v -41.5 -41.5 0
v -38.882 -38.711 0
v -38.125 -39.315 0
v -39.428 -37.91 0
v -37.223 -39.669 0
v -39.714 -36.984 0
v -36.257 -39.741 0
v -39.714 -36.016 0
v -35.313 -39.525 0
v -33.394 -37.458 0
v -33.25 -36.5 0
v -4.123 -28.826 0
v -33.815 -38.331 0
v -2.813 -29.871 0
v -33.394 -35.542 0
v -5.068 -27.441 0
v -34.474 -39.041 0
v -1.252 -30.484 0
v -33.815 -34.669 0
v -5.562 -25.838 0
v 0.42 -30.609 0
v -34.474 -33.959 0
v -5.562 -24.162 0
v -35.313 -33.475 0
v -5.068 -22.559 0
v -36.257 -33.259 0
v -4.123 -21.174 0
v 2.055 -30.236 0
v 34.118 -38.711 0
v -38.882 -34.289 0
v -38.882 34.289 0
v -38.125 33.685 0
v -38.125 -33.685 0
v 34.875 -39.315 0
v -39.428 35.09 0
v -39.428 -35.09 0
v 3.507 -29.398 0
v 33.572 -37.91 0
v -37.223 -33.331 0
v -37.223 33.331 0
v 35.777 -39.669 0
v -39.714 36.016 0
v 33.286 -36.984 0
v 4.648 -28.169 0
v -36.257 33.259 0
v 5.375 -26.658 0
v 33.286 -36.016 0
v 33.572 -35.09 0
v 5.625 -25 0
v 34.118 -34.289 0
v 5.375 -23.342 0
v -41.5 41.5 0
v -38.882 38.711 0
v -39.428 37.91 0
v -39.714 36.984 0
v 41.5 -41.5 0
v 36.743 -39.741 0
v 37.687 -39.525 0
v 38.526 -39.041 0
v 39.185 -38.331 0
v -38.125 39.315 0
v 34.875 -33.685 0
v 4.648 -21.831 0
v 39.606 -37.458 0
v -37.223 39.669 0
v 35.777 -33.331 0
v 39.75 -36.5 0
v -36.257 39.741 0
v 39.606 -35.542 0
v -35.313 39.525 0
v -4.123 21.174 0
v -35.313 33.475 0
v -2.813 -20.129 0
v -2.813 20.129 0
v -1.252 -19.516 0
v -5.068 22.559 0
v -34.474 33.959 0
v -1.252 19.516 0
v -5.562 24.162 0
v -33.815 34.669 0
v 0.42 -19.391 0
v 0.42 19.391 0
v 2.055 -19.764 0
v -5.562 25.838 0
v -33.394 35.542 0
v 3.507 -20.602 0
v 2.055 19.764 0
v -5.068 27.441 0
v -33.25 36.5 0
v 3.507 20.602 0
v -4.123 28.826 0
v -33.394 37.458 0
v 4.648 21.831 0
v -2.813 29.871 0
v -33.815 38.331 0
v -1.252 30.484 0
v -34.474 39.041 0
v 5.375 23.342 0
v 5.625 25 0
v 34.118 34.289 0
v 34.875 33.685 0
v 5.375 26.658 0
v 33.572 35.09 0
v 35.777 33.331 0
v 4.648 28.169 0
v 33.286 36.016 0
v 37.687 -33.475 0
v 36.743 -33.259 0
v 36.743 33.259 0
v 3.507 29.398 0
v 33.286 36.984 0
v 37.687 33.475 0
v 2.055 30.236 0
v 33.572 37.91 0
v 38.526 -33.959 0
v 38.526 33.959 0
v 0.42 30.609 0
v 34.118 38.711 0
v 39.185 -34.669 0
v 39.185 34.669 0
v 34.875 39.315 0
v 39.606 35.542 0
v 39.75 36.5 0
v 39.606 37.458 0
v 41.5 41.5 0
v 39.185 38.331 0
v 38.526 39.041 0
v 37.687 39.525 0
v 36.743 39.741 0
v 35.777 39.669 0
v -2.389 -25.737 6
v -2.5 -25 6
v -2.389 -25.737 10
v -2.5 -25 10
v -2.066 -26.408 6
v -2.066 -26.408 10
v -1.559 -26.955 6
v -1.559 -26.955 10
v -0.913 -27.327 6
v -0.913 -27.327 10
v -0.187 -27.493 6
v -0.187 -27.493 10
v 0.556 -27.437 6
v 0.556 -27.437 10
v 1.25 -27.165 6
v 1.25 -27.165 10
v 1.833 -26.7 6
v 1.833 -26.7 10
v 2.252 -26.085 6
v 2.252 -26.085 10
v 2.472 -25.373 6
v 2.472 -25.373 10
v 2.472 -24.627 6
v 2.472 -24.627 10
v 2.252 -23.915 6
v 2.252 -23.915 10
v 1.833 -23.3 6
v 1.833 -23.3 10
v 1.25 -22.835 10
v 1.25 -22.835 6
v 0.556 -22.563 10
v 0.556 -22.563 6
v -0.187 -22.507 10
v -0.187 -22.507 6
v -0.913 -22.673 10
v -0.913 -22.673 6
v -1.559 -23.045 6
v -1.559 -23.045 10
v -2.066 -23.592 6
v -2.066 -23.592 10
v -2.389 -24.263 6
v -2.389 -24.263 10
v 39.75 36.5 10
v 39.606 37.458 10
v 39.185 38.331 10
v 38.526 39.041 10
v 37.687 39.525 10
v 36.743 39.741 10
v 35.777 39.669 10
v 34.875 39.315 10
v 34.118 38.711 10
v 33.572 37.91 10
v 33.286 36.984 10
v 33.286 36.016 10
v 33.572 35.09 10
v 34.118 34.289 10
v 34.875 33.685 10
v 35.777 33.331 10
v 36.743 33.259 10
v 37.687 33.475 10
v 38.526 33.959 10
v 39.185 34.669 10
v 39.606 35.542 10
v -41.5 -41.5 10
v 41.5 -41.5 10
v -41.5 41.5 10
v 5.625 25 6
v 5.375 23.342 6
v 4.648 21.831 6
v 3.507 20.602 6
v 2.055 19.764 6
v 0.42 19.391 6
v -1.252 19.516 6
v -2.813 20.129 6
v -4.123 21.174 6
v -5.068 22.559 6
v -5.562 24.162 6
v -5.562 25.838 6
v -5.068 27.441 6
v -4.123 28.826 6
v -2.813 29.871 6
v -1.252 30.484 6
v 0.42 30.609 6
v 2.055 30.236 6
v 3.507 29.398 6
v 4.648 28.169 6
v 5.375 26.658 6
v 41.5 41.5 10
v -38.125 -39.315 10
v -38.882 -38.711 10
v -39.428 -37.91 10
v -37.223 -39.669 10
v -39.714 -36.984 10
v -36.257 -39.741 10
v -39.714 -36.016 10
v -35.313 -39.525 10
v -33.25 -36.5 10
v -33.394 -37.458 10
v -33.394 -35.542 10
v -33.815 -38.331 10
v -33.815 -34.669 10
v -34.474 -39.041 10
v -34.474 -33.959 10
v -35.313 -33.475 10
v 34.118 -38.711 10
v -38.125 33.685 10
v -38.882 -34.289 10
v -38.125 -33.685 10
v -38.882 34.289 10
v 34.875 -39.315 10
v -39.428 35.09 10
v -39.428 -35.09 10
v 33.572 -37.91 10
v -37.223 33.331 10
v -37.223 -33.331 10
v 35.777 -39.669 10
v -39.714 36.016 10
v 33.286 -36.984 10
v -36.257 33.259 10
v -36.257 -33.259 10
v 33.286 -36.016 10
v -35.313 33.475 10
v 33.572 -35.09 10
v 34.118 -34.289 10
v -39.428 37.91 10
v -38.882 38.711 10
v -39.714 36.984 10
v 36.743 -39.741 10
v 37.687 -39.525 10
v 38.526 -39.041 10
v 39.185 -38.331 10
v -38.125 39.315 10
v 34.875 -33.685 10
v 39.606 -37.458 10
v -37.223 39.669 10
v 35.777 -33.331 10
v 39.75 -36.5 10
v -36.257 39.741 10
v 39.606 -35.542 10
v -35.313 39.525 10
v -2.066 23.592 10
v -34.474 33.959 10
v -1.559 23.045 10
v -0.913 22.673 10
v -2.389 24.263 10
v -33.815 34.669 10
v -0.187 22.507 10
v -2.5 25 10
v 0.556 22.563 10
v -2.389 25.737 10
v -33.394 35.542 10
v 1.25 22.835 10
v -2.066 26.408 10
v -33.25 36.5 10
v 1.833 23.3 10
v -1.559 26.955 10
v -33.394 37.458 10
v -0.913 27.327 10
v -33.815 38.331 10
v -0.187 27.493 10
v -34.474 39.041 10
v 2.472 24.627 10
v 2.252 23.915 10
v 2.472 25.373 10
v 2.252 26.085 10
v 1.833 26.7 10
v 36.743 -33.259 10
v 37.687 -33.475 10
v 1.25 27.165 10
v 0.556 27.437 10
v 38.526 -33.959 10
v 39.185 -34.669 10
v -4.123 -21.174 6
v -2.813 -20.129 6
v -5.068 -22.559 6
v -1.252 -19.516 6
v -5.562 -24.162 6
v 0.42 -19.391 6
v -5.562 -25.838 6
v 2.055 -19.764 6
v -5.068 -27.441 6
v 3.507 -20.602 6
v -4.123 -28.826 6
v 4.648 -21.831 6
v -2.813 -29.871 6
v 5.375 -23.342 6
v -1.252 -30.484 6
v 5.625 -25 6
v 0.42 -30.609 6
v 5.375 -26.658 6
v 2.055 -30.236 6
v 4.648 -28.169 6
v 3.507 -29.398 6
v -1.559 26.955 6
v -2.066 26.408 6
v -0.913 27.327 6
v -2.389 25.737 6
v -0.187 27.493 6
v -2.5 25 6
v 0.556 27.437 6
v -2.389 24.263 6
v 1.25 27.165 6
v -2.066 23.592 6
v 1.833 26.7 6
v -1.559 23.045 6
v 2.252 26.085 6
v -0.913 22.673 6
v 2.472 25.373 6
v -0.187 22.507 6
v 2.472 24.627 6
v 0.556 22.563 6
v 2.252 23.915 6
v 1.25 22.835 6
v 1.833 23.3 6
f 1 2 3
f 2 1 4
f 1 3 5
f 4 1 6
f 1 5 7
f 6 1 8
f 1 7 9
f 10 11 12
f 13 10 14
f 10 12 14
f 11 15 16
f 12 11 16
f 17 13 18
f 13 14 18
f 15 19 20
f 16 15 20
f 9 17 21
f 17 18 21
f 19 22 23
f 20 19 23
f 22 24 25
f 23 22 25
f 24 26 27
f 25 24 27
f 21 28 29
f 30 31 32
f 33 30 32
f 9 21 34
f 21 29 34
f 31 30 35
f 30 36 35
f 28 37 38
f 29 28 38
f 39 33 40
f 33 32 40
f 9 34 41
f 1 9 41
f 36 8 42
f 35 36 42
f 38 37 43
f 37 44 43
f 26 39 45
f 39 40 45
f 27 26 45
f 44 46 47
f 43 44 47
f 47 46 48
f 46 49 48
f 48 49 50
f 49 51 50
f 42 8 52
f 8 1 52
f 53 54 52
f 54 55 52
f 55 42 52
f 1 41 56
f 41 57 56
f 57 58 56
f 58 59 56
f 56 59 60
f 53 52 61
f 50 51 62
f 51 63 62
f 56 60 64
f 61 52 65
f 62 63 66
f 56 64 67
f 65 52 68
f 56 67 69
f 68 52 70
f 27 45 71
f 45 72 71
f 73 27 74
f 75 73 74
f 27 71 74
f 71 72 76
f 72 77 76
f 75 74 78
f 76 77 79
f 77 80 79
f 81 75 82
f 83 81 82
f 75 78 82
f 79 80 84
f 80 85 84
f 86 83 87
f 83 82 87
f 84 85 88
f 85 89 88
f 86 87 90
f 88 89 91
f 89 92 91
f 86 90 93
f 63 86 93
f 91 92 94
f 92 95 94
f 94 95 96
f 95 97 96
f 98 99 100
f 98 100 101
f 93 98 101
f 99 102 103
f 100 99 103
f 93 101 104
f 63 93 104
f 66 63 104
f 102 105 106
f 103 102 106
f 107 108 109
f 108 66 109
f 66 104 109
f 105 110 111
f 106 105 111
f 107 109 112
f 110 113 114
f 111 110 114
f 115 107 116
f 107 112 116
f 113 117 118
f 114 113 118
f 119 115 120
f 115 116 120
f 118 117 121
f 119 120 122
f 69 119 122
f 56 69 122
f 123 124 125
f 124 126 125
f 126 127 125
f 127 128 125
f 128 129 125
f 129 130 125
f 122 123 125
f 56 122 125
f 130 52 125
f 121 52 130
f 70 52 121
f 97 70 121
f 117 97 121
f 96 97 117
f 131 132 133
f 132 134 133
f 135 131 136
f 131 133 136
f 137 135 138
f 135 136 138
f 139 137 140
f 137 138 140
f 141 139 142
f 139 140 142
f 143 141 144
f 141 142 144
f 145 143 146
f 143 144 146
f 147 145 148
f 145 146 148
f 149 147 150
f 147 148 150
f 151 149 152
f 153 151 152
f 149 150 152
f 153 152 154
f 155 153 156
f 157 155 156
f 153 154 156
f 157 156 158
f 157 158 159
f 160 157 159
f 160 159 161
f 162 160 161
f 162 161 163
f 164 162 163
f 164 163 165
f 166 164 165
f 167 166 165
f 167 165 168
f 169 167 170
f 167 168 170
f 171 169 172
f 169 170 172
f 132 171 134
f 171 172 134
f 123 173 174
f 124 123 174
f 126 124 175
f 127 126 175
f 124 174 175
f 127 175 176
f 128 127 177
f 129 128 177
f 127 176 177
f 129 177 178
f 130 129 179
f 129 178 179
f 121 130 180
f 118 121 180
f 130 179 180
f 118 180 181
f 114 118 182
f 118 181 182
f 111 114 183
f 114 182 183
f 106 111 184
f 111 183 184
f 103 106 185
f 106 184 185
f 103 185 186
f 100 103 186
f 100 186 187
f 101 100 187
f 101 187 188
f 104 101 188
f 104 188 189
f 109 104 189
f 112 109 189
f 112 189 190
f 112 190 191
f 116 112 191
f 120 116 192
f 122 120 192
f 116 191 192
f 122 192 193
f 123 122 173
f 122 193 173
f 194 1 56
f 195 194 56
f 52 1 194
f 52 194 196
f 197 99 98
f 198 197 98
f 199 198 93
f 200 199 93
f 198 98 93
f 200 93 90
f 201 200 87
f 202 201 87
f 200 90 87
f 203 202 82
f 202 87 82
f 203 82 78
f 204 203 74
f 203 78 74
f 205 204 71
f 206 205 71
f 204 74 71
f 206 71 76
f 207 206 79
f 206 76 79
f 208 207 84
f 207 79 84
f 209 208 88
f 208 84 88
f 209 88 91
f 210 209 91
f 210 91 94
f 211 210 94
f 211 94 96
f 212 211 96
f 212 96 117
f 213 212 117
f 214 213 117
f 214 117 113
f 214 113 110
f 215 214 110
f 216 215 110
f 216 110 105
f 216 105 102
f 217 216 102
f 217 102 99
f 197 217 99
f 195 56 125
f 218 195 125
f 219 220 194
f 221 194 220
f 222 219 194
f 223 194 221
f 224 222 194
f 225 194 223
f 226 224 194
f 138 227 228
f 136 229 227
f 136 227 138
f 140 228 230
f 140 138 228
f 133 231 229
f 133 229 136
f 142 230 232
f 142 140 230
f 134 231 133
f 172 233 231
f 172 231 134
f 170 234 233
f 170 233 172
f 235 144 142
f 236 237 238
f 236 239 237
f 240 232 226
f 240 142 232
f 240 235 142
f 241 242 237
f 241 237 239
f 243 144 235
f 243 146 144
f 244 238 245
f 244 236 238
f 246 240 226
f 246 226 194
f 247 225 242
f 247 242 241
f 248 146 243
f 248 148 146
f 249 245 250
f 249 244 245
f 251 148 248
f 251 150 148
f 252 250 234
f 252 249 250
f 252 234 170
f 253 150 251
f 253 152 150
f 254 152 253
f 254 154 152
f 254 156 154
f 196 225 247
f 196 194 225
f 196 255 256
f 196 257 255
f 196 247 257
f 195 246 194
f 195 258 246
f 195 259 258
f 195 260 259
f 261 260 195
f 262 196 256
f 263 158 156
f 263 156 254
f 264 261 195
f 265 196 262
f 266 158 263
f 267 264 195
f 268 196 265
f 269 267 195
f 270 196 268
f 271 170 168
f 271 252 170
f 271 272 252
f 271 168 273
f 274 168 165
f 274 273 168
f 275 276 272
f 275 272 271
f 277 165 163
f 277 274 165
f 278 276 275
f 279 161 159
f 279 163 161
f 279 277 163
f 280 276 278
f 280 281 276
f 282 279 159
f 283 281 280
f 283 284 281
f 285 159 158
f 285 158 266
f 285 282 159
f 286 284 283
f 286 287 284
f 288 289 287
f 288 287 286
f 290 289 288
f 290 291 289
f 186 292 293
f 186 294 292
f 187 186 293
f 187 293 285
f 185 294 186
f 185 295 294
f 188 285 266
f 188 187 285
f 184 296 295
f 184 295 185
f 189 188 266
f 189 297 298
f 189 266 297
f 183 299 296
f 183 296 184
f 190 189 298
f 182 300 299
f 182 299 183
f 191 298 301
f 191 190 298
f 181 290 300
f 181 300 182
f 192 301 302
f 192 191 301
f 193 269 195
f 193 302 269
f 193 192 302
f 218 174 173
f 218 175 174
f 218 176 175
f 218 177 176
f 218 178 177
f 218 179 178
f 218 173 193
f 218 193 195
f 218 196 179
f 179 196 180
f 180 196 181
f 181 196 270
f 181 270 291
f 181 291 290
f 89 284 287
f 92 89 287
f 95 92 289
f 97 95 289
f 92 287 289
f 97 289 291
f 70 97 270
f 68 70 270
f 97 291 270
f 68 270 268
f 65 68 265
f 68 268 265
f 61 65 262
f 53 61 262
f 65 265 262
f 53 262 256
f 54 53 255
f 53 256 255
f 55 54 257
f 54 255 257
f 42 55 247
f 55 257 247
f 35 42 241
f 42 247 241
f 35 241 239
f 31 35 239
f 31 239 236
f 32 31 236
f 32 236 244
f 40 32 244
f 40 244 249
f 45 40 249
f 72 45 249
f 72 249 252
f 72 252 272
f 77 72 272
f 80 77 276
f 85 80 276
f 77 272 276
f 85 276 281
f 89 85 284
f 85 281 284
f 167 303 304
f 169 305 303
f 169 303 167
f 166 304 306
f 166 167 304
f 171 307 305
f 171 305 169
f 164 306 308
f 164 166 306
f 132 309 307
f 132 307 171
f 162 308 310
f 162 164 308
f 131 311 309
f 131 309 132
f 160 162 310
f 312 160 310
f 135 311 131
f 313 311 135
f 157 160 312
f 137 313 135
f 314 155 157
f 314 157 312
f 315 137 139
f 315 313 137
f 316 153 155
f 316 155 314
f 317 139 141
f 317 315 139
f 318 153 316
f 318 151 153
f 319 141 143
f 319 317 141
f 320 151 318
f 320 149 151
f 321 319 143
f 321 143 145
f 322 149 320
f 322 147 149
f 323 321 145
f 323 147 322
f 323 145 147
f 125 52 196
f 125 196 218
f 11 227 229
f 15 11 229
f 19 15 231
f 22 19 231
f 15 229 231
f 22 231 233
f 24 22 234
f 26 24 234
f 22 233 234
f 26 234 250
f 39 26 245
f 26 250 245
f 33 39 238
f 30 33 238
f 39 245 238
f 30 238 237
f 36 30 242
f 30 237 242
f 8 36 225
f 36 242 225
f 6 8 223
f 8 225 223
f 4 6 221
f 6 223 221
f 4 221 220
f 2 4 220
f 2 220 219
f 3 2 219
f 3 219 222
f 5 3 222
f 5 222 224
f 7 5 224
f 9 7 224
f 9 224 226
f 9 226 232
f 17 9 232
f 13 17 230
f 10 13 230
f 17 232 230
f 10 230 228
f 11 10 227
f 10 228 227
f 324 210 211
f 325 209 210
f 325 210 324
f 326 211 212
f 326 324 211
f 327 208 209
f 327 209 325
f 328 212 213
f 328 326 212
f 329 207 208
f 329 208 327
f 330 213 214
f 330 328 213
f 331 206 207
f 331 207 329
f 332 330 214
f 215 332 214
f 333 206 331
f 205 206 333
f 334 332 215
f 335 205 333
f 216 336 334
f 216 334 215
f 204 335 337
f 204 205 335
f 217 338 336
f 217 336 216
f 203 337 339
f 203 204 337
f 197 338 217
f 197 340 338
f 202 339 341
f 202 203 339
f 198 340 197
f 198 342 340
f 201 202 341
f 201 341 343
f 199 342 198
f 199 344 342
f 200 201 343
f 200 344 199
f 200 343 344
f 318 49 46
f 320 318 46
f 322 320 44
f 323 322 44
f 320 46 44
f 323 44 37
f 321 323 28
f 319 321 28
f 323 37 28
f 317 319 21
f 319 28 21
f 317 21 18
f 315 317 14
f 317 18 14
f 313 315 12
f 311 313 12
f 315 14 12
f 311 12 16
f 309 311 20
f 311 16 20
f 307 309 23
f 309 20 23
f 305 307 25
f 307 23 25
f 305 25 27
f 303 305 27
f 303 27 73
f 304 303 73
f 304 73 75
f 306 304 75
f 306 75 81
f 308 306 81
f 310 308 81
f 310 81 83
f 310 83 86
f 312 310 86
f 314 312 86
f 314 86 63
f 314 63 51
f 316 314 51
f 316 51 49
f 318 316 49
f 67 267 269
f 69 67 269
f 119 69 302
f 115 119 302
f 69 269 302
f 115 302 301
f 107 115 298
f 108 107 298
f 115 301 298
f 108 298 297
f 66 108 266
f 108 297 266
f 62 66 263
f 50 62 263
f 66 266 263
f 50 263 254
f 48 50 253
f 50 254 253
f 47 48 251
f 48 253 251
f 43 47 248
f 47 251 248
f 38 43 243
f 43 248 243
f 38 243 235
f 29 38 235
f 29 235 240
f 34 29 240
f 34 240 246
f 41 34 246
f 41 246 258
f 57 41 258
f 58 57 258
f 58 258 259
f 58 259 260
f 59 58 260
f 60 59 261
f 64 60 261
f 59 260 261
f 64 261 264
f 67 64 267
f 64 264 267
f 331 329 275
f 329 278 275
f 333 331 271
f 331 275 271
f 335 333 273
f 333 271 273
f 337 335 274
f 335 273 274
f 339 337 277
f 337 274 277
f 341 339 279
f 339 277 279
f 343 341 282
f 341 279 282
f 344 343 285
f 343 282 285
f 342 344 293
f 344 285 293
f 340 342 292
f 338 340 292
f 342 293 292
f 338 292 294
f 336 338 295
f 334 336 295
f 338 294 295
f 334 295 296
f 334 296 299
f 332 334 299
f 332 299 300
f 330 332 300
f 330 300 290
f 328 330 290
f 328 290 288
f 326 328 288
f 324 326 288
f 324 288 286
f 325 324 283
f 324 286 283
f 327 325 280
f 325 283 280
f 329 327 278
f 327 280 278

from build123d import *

# Parameters (mm, degrees)
F0_W           = 83
F0_H           = 83
F1_DEPTH       = 10
F2_R           = 3.25
F3_DEPTH       = 10
F5_D           = 5
F5_DEPTH       = 15
F5_CBORE_D     = 11.25
F5_CBORE_DEPTH = 6
F5_TIP         = 1.5021515476


with BuildPart() as f1:
    # F0 (on Top) → F1 (new body)
    with BuildSketch(Plane.XY):
        Rectangle(F0_W, F0_H)
    extrude(amount=F1_DEPTH)

    # F2 (on face) → F3 (cut, through all)
    with BuildSketch(Plane.XY.offset(10)):
        with Locations((-36.5, 36.5)):
            Circle(F2_R)
        with Locations((-36.5, -36.5)):
            Circle(F2_R)
        with Locations((36.5, -36.5)):
            Circle(F2_R)
        with Locations((36.5, 36.5)):
            Circle(F2_R)
    extrude(amount=-F3_DEPTH, mode=Mode.SUBTRACT)

    # F5
    with Locations(Plane(origin=(0, 0, 0), x_dir=(1, 0, 0), z_dir=(0, 0, -1))):
        with Locations((0, -25), (0, 25)):
            CounterBoreHole(F5_D / 2, F5_CBORE_D / 2, F5_CBORE_DEPTH, depth=F5_DEPTH)
            with Locations((0, 0, -(F5_DEPTH + F5_TIP / 2))):  # 118° drill point
                Cone(0, F5_D / 2, F5_TIP, mode=Mode.SUBTRACT)


solid = f1.part
